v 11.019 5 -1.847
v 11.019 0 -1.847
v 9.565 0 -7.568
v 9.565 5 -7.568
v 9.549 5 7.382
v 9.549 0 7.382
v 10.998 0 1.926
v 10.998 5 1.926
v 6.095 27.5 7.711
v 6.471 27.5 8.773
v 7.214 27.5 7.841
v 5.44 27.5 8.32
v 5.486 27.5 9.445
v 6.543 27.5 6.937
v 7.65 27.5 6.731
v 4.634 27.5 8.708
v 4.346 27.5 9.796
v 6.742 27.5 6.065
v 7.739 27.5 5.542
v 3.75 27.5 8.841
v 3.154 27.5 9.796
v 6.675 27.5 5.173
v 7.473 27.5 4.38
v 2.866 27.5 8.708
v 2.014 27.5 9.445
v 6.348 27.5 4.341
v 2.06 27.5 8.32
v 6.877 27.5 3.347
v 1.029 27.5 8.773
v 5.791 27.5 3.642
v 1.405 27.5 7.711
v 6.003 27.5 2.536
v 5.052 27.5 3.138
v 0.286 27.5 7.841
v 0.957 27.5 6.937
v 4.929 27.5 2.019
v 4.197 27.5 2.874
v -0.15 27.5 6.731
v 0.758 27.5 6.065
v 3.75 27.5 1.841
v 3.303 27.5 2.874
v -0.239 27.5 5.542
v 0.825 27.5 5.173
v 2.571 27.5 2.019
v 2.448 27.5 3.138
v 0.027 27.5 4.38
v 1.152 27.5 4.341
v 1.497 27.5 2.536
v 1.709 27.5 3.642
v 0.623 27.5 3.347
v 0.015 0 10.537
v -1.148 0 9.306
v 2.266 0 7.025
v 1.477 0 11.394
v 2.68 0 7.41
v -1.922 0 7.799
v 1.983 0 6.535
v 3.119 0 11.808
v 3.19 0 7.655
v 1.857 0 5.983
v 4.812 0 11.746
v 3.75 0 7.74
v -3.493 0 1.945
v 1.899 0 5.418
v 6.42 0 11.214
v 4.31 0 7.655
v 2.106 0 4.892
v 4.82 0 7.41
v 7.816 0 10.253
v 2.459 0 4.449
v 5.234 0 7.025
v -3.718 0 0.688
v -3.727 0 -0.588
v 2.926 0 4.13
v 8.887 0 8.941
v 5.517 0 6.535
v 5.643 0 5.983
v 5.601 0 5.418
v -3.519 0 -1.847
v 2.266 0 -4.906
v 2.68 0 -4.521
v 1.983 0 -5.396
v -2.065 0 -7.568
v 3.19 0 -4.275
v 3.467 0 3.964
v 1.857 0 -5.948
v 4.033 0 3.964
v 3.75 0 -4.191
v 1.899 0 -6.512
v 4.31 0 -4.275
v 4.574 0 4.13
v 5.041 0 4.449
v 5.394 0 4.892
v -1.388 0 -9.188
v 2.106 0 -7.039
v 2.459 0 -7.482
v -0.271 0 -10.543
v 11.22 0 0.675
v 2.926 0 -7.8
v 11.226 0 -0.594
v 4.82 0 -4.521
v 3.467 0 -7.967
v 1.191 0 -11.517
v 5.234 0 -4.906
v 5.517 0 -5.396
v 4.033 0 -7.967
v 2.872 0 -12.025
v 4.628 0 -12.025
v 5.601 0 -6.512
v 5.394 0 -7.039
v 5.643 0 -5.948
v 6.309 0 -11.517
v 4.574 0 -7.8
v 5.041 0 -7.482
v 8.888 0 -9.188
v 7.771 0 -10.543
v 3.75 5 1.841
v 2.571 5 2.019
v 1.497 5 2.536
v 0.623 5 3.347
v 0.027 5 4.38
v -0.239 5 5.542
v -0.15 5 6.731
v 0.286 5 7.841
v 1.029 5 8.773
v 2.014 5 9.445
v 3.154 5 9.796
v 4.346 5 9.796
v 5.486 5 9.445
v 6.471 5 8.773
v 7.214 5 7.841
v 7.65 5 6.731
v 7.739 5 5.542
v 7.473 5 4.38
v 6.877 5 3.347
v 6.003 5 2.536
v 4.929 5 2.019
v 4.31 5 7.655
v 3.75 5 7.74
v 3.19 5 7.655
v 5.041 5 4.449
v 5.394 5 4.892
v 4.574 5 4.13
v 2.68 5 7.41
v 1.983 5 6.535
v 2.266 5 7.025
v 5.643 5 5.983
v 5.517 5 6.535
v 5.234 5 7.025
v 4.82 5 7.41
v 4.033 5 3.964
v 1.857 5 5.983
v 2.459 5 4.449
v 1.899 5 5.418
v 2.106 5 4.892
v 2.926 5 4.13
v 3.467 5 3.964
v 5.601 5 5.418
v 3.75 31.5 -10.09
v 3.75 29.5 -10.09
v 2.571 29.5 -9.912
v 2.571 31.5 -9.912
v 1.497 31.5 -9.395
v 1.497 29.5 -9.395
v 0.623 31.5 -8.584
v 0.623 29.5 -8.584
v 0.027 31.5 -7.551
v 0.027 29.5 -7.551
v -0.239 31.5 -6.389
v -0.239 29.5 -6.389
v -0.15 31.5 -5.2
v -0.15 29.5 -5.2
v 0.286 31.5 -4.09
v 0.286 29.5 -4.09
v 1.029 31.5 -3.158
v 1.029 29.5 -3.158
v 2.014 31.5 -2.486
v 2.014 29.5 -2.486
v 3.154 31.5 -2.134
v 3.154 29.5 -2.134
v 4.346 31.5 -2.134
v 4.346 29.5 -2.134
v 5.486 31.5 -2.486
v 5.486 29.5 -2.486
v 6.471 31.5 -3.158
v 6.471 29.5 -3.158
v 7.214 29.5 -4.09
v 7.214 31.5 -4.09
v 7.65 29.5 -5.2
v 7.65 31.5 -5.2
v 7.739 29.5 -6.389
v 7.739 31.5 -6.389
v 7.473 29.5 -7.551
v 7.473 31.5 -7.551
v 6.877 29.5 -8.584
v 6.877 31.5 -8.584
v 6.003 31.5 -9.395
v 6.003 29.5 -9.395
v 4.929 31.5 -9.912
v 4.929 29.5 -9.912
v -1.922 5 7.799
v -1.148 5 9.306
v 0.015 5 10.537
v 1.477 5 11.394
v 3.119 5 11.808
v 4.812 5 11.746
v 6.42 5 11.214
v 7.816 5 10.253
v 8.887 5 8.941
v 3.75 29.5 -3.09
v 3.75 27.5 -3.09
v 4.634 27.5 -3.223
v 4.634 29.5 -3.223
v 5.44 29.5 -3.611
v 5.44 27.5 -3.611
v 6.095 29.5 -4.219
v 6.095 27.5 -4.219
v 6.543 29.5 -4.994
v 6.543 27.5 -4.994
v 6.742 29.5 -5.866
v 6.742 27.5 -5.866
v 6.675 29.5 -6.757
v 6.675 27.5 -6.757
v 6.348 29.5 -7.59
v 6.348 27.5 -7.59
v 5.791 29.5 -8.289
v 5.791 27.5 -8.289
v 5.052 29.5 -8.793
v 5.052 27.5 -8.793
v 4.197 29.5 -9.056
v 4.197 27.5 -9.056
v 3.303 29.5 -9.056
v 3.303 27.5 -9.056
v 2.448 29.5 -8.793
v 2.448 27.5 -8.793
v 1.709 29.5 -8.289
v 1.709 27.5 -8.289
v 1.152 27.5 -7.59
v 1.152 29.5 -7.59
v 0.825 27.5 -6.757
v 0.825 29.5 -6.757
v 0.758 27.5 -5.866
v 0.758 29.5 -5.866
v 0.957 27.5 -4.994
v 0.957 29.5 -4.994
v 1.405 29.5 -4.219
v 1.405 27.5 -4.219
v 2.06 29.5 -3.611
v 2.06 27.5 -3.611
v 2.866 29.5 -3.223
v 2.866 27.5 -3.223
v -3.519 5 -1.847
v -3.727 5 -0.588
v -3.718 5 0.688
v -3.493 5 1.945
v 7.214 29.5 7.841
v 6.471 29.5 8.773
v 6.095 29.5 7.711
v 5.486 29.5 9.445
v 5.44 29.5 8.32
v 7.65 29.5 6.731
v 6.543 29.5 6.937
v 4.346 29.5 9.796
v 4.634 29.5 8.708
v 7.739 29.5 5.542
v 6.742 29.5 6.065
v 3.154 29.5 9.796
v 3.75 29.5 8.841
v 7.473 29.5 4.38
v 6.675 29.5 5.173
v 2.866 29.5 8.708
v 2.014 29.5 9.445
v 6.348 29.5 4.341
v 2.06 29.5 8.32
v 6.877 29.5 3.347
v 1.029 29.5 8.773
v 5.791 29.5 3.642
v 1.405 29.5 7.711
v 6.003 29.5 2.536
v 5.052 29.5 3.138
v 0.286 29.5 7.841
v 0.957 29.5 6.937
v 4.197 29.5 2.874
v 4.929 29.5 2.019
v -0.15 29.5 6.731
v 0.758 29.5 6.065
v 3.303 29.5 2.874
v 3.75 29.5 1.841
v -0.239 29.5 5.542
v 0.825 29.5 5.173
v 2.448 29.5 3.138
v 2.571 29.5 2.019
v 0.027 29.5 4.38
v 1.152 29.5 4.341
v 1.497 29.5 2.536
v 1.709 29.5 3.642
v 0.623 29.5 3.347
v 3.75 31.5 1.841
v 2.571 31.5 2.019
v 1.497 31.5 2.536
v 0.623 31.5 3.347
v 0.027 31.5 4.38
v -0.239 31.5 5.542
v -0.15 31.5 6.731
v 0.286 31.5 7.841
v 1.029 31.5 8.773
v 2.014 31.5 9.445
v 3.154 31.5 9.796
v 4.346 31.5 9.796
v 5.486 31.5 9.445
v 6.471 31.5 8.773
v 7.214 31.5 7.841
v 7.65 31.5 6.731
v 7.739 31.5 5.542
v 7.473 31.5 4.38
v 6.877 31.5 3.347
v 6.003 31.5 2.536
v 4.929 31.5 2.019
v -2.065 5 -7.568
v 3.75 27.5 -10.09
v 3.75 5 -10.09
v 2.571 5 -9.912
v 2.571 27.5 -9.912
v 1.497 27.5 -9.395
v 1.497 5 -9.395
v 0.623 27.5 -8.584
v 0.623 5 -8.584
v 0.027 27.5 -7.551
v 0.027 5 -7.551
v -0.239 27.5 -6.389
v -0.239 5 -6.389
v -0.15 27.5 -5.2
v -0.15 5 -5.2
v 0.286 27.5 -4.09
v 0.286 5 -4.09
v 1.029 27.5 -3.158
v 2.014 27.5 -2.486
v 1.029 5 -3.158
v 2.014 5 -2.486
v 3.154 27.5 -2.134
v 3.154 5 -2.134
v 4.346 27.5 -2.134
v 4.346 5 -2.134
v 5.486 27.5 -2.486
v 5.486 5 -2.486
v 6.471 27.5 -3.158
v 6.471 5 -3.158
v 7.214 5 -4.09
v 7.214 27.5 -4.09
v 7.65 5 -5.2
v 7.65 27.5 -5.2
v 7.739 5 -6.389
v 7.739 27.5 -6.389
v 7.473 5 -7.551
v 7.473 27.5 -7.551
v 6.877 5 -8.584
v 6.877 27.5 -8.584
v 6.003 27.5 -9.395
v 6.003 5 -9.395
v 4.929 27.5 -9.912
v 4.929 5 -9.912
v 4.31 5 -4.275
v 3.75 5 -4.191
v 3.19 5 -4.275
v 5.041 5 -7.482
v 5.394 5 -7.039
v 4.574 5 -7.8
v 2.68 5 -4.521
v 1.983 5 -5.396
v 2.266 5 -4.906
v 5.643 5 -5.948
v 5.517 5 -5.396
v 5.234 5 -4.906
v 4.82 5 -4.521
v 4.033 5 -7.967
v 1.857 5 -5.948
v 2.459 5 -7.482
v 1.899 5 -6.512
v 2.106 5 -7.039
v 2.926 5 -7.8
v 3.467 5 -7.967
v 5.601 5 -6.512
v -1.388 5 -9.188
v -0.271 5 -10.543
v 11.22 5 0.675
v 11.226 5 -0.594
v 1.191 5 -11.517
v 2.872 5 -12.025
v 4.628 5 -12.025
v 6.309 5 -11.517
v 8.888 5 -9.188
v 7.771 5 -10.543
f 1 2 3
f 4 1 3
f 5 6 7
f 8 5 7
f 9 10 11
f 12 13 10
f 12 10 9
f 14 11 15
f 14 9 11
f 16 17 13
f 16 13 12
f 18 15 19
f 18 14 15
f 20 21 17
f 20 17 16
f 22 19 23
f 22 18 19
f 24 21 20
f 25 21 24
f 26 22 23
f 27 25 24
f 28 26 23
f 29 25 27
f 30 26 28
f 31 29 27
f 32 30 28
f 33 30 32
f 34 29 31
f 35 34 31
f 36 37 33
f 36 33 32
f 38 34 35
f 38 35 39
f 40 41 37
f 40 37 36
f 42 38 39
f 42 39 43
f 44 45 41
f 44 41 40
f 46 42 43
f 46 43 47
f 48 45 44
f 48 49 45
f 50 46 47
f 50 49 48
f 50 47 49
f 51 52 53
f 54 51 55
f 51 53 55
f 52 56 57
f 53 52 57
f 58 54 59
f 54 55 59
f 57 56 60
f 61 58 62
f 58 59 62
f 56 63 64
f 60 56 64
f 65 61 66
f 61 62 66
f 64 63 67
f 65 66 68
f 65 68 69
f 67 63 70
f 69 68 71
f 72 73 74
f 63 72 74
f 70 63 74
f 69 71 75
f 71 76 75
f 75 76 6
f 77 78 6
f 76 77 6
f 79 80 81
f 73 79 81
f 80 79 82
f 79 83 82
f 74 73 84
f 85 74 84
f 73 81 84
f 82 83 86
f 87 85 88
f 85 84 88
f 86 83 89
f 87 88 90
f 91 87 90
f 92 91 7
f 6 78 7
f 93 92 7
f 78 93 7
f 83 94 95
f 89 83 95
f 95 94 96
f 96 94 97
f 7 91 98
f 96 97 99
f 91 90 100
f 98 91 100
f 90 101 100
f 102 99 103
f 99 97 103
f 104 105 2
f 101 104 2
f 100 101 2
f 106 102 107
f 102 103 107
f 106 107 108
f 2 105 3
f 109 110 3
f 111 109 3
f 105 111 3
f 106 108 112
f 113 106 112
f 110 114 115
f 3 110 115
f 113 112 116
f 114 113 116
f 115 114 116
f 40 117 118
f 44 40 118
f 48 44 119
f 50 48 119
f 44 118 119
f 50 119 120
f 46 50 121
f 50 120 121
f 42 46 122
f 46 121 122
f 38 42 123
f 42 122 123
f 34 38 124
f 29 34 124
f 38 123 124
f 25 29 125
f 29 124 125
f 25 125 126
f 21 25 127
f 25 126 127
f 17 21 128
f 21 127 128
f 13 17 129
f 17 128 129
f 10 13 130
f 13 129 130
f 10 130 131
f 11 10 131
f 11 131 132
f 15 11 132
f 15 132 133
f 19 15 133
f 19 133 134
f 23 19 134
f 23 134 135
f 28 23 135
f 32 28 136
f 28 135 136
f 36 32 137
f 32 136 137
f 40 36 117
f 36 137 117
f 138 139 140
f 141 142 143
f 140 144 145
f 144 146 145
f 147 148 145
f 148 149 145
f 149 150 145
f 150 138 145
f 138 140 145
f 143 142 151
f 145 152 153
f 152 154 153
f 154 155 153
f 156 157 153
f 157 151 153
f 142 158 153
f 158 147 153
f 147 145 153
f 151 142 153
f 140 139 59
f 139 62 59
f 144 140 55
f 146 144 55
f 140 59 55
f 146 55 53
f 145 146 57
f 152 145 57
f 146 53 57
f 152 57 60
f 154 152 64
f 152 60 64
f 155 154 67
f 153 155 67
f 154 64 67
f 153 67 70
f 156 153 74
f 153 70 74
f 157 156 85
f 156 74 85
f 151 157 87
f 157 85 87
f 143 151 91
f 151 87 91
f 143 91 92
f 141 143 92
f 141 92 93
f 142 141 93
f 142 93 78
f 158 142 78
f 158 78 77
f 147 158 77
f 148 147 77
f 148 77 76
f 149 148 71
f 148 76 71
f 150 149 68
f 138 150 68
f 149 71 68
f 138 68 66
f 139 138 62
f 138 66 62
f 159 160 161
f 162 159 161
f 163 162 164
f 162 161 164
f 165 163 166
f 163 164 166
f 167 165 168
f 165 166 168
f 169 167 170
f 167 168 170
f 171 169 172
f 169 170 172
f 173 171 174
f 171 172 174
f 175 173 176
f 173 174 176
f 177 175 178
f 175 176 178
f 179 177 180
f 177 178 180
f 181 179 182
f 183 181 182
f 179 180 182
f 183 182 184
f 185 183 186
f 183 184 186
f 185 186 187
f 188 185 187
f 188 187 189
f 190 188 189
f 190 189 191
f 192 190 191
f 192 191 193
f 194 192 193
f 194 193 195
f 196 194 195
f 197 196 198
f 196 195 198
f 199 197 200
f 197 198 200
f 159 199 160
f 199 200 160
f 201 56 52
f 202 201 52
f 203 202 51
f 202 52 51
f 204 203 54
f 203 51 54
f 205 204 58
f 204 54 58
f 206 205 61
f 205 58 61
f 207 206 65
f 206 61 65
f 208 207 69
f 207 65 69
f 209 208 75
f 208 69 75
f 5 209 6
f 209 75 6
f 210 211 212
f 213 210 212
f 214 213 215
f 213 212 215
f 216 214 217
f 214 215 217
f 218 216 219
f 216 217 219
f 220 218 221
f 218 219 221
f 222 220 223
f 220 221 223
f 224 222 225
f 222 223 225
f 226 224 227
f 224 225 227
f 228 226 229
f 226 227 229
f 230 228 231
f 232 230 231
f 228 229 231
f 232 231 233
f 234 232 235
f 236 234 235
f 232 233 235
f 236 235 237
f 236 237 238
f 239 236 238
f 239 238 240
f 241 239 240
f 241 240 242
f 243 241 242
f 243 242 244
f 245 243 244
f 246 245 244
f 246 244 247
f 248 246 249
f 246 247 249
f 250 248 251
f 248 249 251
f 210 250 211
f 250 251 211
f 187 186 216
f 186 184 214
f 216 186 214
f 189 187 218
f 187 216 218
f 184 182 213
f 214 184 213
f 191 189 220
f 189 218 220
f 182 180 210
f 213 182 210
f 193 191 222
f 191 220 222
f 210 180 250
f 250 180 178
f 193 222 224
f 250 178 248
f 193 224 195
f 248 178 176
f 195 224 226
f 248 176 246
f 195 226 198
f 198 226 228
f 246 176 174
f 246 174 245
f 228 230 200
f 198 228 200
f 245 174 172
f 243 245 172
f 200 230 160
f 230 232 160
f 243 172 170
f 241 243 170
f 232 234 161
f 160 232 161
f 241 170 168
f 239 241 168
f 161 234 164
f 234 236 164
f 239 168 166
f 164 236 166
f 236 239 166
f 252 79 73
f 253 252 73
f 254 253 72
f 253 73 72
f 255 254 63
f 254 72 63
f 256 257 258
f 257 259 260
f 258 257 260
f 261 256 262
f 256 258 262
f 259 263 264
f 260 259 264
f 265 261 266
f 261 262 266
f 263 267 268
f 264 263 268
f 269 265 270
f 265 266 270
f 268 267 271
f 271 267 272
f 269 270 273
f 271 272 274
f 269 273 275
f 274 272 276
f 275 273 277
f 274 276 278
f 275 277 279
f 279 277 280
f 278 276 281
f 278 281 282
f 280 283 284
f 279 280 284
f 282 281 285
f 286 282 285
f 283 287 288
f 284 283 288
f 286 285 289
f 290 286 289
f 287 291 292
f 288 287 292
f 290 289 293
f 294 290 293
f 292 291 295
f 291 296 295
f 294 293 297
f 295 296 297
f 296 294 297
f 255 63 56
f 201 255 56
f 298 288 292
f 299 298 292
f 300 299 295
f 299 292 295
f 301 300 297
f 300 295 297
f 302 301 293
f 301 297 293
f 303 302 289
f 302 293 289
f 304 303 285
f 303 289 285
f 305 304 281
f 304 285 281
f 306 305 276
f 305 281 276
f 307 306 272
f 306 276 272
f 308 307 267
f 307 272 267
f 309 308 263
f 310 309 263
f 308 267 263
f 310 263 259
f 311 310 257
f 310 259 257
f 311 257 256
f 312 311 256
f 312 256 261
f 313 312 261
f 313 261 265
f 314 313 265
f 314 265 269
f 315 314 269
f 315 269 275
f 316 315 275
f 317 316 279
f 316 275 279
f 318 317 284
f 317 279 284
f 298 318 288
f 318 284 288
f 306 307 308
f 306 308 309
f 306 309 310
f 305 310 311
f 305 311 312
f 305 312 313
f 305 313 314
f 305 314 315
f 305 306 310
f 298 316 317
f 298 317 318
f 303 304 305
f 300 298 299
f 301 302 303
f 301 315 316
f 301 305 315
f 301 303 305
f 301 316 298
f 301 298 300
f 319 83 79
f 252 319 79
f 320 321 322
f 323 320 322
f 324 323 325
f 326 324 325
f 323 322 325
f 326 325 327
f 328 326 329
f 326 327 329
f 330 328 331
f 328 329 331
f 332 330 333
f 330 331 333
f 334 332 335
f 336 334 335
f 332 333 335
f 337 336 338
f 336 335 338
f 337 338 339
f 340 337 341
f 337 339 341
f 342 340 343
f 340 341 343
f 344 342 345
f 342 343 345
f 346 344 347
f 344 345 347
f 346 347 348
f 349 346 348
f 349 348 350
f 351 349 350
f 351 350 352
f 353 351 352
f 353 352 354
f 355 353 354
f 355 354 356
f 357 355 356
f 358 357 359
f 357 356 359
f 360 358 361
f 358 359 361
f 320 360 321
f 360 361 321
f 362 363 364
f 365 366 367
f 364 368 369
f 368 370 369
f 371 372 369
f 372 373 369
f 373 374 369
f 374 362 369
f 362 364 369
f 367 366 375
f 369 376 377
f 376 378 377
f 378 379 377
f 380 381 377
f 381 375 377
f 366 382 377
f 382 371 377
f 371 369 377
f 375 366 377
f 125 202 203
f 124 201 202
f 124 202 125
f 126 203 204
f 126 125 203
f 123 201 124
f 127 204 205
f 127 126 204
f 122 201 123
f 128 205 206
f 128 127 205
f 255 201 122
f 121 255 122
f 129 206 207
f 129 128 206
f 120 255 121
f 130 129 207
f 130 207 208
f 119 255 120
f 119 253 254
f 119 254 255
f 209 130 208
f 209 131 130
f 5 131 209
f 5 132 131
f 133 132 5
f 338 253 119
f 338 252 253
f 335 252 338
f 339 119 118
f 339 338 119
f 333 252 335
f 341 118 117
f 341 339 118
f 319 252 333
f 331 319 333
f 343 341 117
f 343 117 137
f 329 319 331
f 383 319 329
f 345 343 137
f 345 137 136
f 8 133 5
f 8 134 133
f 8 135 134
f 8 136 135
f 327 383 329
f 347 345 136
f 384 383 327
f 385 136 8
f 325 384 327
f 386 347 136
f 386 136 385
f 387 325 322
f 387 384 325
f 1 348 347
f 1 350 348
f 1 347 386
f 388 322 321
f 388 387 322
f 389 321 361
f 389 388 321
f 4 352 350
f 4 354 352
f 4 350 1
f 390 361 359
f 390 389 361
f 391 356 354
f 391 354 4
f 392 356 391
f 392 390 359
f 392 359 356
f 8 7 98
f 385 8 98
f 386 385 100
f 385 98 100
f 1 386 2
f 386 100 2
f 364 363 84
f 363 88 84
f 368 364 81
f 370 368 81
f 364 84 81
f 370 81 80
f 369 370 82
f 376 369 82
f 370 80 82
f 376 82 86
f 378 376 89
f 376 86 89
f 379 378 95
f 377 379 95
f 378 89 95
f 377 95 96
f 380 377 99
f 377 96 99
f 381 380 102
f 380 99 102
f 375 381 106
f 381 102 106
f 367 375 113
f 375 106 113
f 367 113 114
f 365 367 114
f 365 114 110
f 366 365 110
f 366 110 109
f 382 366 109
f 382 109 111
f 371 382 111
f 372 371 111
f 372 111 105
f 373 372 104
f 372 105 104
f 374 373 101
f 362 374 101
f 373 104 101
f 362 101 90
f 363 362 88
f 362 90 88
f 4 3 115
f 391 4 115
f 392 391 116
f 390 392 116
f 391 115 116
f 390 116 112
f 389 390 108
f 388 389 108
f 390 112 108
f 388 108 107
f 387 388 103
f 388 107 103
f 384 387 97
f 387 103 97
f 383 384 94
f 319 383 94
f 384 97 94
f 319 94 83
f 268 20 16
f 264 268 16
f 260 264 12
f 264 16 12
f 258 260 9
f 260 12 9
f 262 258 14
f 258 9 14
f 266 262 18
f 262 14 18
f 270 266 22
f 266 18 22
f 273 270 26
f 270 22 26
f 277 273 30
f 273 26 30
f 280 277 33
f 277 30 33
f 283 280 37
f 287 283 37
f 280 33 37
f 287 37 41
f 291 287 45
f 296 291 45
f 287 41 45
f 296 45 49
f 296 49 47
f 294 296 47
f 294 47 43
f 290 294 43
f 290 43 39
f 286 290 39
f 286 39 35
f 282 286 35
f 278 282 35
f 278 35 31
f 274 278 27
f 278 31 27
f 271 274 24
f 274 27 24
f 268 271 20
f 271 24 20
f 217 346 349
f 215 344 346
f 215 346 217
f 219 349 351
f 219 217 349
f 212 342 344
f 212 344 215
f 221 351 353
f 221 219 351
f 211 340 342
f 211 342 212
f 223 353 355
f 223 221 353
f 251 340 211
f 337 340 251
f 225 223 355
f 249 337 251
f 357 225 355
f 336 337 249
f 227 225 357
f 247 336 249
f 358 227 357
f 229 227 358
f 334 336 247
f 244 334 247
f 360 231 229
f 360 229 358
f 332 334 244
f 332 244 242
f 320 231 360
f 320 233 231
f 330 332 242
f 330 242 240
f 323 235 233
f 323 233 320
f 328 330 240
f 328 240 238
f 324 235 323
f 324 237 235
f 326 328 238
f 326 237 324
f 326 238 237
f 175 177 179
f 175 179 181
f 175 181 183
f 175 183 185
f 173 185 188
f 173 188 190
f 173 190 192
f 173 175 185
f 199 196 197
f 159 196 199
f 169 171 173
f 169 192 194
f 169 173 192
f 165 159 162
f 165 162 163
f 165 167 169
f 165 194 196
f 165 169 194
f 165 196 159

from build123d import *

# Parameters (mm, degrees)
BOSS_EXTRUDE2_DEPTH            = 5
SKETCH3_R                      = 4
BOSS_EXTRUDE3_DEPTH            = 22.5
SKETCH4_R                      = 3
BOSS_EXTRUDE4_DEPTH            = 2
SKETCH5_R                      = 4
BOSS_EXTRUDE5_DEPTH            = 2
SKETCH7_W                      = 1.89865
SKETCH7_H                      = 5
F_6_CLEARANCE_HOLE1_AT_2_COUNT = 2
F_6_CLEARANCE_HOLE1_AT_2_PITCH = 11.930689284


with BuildPart() as part:
    # Sketch2 → Boss-Extrude2 (new body)
    with BuildSketch(Plane(origin=(0, 0, 0), x_dir=(1, 0, 0), z_dir=(0, 1, 0))):
        with BuildLine():
            ThreePointArc((-1.921673483, -7.798539123), (3.967844549, -11.837003018), (9.548776015, -7.381801872))
            Line((9.548776015, -7.381801872), (10.998470019, -1.926053578))
            ThreePointArc((10.998470019, -1.926053578), (11.24988985, -0.04064778), (11.018921171, 1.84737246))
            Line((11.018921171, 1.84737246), (9.565136937, 7.567628243))
            ThreePointArc((9.565136937, 7.567628243), (3.75, 12.089730275), (-2.065136937, 7.567628243))
            Line((-2.065136937, 7.567628243), (-3.518921171, 1.84737246))
            ThreePointArc((-3.518921171, 1.84737246), (-3.749830525, -0.050419155), (-3.493426606, -1.944934706))
            Line((-3.493426606, -1.944934706), (-1.921673483, -7.798539123))
        make_face()
    extrude(amount=BOSS_EXTRUDE2_DEPTH)

    # Sketch3 → Boss-Extrude3 (add)
    with BuildSketch(Plane(origin=(0, 5, 0), x_dir=(1, 0, 0), z_dir=(0, 1, 0))):
        with Locations(Location((3.75, -5.840959009, 0), (0, 0, 90))):
            Circle(SKETCH3_R)
        with Locations(Location((3.75, 6.089730275, 0), (0, 0, 90))):
            Circle(SKETCH3_R)
    extrude(amount=BOSS_EXTRUDE3_DEPTH)

    # Sketch4 → Boss-Extrude4 (add)
    with BuildSketch(Plane(origin=(0, 27.5, 0), x_dir=(1, 0, 0), z_dir=(0, 1, 0))):
        with Locations(Location((3.75, -5.840959009, 0), (0, 0, 270))):
            Circle(SKETCH4_R)
        with Locations(Location((3.75, 6.089730275, 0), (0, 0, 270))):
            Circle(SKETCH4_R)
    extrude(amount=BOSS_EXTRUDE4_DEPTH)

    # Sketch5 → Boss-Extrude5 (add)
    with BuildSketch(Plane(origin=(0, 29.5, 0), x_dir=(1, 0, 0), z_dir=(0, 1, 0))):
        with Locations(Location((3.75, -5.840959009, 0), (0, 0, 90))):
            Circle(SKETCH5_R)
        with Locations(Location((3.75, 6.089730275, 0), (0, 0, 90))):
            Circle(SKETCH5_R)
    extrude(amount=BOSS_EXTRUDE5_DEPTH)

    # Sketch7 → #6 Clearance Hole1 (revolve, cut)
    with BuildSketch(Plane(origin=(3.75, 5, -6.089730275), x_dir=(0, 0, 1), z_dir=(1, 0, 0))):
        with Locations((0.949325, 2.5)):
            Rectangle(SKETCH7_W, SKETCH7_H)
    f_6_clearance_hole1 = revolve(axis=Axis((3.75, 11.35, -6.089730275), (0, -1, 0)), mode=Mode.SUBTRACT)

    # #6 Clearance Hole1 at 2: #6 Clearance Hole1 ×2
    with Locations(*[(0, 0, i * F_6_CLEARANCE_HOLE1_AT_2_PITCH) for i in range(1, F_6_CLEARANCE_HOLE1_AT_2_COUNT)]):
        add(f_6_clearance_hole1, mode=Mode.SUBTRACT)


solid = part.part
